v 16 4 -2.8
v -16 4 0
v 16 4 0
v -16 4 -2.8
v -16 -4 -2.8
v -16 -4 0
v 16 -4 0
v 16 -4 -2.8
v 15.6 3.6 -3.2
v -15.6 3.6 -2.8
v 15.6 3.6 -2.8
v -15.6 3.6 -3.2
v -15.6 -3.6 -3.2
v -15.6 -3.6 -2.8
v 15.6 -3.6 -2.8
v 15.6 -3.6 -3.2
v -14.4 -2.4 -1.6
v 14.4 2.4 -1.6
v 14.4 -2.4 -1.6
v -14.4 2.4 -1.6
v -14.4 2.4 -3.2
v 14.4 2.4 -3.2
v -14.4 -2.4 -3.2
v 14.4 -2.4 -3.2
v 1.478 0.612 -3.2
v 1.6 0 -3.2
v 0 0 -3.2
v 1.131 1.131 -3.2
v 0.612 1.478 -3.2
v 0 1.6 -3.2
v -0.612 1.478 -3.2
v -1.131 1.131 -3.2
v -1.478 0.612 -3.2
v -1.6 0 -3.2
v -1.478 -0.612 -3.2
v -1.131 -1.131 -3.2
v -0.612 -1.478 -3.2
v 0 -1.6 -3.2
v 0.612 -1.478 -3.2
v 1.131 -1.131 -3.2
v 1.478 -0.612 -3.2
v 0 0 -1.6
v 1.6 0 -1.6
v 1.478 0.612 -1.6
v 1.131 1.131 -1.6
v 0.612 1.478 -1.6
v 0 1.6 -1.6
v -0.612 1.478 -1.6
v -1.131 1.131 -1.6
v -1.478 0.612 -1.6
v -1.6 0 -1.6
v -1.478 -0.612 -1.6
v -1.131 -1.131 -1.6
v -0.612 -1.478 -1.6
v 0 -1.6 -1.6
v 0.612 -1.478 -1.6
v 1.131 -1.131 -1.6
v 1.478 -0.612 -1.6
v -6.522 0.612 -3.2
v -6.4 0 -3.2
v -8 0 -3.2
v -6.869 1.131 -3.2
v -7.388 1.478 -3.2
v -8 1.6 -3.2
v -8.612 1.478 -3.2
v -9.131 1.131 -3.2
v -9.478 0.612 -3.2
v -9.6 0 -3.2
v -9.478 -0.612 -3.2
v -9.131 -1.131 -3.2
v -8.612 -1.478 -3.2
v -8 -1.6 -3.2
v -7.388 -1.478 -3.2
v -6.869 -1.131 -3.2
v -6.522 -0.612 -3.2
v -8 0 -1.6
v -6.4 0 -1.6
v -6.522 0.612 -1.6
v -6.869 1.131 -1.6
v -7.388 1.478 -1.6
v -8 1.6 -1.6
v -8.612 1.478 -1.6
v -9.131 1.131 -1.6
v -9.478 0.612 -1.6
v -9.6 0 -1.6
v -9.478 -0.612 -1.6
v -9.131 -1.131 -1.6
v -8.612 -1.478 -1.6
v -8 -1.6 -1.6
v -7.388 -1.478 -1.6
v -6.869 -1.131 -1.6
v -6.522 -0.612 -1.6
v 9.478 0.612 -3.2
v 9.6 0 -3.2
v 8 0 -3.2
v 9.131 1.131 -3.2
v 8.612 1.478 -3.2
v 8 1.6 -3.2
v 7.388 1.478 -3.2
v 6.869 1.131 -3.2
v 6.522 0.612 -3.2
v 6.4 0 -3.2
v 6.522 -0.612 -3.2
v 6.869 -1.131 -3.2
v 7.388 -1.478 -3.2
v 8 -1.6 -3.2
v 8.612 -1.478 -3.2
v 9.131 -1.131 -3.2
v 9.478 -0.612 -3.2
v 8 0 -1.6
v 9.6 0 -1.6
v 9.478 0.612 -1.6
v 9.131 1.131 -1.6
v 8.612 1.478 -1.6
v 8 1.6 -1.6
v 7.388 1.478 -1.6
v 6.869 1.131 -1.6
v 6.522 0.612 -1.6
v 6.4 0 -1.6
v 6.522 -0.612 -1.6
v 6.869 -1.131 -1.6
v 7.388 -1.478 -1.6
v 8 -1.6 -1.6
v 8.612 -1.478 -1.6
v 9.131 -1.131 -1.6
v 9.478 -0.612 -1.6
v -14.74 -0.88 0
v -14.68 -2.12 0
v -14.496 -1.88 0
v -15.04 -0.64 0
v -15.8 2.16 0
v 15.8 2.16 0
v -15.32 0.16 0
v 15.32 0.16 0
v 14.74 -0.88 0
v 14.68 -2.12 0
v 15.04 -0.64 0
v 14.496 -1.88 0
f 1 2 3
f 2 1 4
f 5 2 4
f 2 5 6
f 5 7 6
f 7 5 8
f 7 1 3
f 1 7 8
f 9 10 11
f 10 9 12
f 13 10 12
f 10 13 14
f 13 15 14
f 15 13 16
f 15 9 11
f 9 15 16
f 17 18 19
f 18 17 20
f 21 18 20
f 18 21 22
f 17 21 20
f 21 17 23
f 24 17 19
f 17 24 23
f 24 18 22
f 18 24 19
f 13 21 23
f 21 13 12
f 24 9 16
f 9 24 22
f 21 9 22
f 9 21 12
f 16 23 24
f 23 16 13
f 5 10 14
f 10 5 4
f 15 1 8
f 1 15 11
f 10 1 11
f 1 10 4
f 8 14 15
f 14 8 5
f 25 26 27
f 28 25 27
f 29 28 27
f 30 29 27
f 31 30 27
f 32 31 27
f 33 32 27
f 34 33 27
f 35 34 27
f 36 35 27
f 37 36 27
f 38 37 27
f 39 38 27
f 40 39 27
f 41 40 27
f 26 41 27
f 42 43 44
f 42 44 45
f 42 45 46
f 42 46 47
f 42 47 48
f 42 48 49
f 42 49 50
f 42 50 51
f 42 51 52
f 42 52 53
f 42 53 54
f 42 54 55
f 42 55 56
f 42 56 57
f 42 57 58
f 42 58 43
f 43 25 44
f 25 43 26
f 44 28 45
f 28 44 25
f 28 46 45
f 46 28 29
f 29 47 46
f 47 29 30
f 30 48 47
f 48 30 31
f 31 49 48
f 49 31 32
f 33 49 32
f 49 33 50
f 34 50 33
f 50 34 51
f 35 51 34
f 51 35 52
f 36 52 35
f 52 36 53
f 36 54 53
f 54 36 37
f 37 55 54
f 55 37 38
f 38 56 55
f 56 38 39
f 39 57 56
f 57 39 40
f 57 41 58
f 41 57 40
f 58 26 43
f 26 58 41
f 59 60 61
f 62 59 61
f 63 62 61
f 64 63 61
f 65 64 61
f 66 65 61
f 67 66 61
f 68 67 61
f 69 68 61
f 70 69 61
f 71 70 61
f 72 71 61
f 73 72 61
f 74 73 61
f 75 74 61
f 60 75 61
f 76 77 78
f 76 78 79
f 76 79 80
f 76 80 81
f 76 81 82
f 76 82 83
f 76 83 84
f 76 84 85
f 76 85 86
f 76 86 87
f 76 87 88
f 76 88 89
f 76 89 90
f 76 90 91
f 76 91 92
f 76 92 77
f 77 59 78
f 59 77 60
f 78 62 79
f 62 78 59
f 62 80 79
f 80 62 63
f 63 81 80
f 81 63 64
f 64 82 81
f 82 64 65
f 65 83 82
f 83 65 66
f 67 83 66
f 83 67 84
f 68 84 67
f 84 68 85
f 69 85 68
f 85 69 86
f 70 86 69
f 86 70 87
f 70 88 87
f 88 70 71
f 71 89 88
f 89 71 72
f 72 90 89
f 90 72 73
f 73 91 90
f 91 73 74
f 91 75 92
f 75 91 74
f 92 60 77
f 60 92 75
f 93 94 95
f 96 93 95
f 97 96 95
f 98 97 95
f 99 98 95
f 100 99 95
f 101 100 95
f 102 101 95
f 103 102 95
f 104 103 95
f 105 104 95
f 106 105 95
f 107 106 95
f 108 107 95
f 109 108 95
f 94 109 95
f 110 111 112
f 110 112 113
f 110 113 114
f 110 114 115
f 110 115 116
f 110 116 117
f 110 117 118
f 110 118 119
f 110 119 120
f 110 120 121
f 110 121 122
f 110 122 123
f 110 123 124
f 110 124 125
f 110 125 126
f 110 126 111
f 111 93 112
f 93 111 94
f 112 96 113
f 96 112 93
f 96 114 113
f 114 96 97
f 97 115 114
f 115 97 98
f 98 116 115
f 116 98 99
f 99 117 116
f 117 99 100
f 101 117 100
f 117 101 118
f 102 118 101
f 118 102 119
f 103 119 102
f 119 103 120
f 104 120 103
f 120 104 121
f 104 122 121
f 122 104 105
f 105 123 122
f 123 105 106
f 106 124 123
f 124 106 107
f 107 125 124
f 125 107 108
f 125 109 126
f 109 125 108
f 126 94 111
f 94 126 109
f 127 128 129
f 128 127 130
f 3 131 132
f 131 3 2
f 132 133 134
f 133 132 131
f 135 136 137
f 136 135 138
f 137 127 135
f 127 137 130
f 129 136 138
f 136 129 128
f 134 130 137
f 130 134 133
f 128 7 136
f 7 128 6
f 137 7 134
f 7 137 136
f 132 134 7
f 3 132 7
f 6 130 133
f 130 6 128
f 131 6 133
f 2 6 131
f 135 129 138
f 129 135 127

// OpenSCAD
// file: ../p/4-4edge.scad
use <../lib.scad>
function ldraw_lib__4_4edge() = [
// 0 Circle 1.0
// 0 Name: 4-4edge.dat
// 0 Author: James Jessiman
// 0 !LDRAW_ORG Primitive UPDATE 2017-01
// 0 !LICENSE Licensed under CC BY 2.0 and CC BY 4.0 : see CAreadme.txt
// 
// 0 BFC CERTIFY CCW
  [0,"BFC","CERTIFY"],
  [0,"BFC","CCW"],
// 
// 0 !HISTORY 1998-12-15 [PTadmin] Official Update 1998-10
// 0 !HISTORY 2005-12-28 [PTadmin] Official Update 2005-01
// 0 !HISTORY 2007-06-24 [PTadmin] Header formatted for Contributor Agreement
// 0 !HISTORY 2008-07-01 [PTadmin] Official Update 2008-01
// 0 !HISTORY 2017-01-15 [Steffen] BFCed
// 0 !HISTORY 2017-12-30 [PTadmin] Official Update 2017-01
// 
// 
// 2 24 1 0 0 0.9239 0 0.3827
  [2,24,1,0,0,0.9239,0,0.3827],
// 2 24 0.9239 0 0.3827 0.7071 0 0.7071
  [2,24,0.9239,0,0.3827,0.7071,0,0.7071],
// 2 24 0.7071 0 0.7071 0.3827 0 0.9239
  [2,24,0.7071,0,0.7071,0.3827,0,0.9239],
// 2 24 0.3827 0 0.9239 0 0 1
  [2,24,0.3827,0,0.9239,0,0,1],
// 2 24 0 0 1 -0.3827 0 0.9239
  [2,24,0,0,1,-0.3827,0,0.9239],
// 2 24 -0.3827 0 0.9239 -0.7071 0 0.7071
  [2,24,-0.3827,0,0.9239,-0.7071,0,0.7071],
// 2 24 -0.7071 0 0.7071 -0.9239 0 0.3827
  [2,24,-0.7071,0,0.7071,-0.9239,0,0.3827],
// 2 24 -0.9239 0 0.3827 -1 0 -0
  [2,24,-0.9239,0,0.3827,-1,0,-0],
// 2 24 -1 0 -0 -0.9239 0 -0.3827
  [2,24,-1,0,-0,-0.9239,0,-0.3827],
// 2 24 -0.9239 0 -0.3827 -0.7071 0 -0.7071
  [2,24,-0.9239,0,-0.3827,-0.7071,0,-0.7071],
// 2 24 -0.7071 0 -0.7071 -0.3827 0 -0.9239
  [2,24,-0.7071,0,-0.7071,-0.3827,0,-0.9239],
// 2 24 -0.3827 0 -0.9239 0 0 -1
  [2,24,-0.3827,0,-0.9239,0,0,-1],
// 2 24 0 0 -1 0.3827 0 -0.9239
  [2,24,0,0,-1,0.3827,0,-0.9239],
// 2 24 0.3827 0 -0.9239 0.7071 0 -0.7071
  [2,24,0.3827,0,-0.9239,0.7071,0,-0.7071],
// 2 24 0.7071 0 -0.7071 0.9239 0 -0.3827
  [2,24,0.7071,0,-0.7071,0.9239,0,-0.3827],
// 2 24 0.9239 0 -0.3827 1 0 0
  [2,24,0.9239,0,-0.3827,1,0,0],
];
module ldraw_lib__4_4edge(step=0, col=false, unit=2/5, alt=false, line=0.2, solid=!$preview)
    makepoly(ldraw_lib__4_4edge(), step=step, col=col, unit=unit, alt=alt, line=line, solid=solid);
ldraw_lib__4_4edge(line=0.2);
// file: ../p/4-4disc.scad
use <../lib.scad>
function ldraw_lib__4_4disc() = [
// 0 Disc 1.0
// 0 Name: 4-4disc.dat
// 0 Author: James Jessiman
// 0 !LDRAW_ORG Primitive UPDATE 2002-02
// 0 !LICENSE Licensed under CC BY 2.0 and CC BY 4.0 : see CAreadme.txt
// 
// 0 BFC CERTIFY CCW
  [0,"BFC","CERTIFY"],
  [0,"BFC","CCW"],
// 
// 0 !HISTORY 1998-12-15 [PTadmin] Official Update 1998-10
// 0 !HISTORY 2002-03-23 [sbliss] Added BFC statement
// 0 !HISTORY 2002-04-25 [PTadmin] Official Update 2002-02
// 0 !HISTORY 2007-06-24 [PTadmin] Header formatted for Contributor Agreement
// 0 !HISTORY 2008-07-01 [PTadmin] Official Update 2008-01
// 
// 
// 3 16 0 0 0 1 0 0 0.9239 0 0.3827
  [3,16,0,0,0,1,0,0,0.9239,0,0.3827],
// 3 16 0 0 0 0.9239 0 0.3827 0.7071 0 0.7071
  [3,16,0,0,0,0.9239,0,0.3827,0.7071,0,0.7071],
// 3 16 0 0 0 0.7071 0 0.7071 0.3827 0 0.9239
  [3,16,0,0,0,0.7071,0,0.7071,0.3827,0,0.9239],
// 3 16 0 0 0 0.3827 0 0.9239 0 0 1
  [3,16,0,0,0,0.3827,0,0.9239,0,0,1],
// 3 16 0 0 0 0 0 1 -0.3827 0 0.9239
  [3,16,0,0,0,0,0,1,-0.3827,0,0.9239],
// 3 16 0 0 0 -0.3827 0 0.9239 -0.7071 0 0.7071
  [3,16,0,0,0,-0.3827,0,0.9239,-0.7071,0,0.7071],
// 3 16 0 0 0 -0.7071 0 0.7071 -0.9239 0 0.3827
  [3,16,0,0,0,-0.7071,0,0.7071,-0.9239,0,0.3827],
// 3 16 0 0 0 -0.9239 0 0.3827 -1 0 -0
  [3,16,0,0,0,-0.9239,0,0.3827,-1,0,-0],
// 3 16 0 0 0 -1 0 -0 -0.9239 0 -0.3827
  [3,16,0,0,0,-1,0,-0,-0.9239,0,-0.3827],
// 3 16 0 0 0 -0.9239 0 -0.3827 -0.7071 0 -0.7071
  [3,16,0,0,0,-0.9239,0,-0.3827,-0.7071,0,-0.7071],
// 3 16 0 0 0 -0.7071 0 -0.7071 -0.3827 0 -0.9239
  [3,16,0,0,0,-0.7071,0,-0.7071,-0.3827,0,-0.9239],
// 3 16 0 0 0 -0.3827 0 -0.9239 0 0 -1
  [3,16,0,0,0,-0.3827,0,-0.9239,0,0,-1],
// 3 16 0 0 0 0 0 -1 0.3827 0 -0.9239
  [3,16,0,0,0,0,0,-1,0.3827,0,-0.9239],
// 3 16 0 0 0 0.3827 0 -0.9239 0.7071 0 -0.7071
  [3,16,0,0,0,0.3827,0,-0.9239,0.7071,0,-0.7071],
// 3 16 0 0 0 0.7071 0 -0.7071 0.9239 0 -0.3827
  [3,16,0,0,0,0.7071,0,-0.7071,0.9239,0,-0.3827],
// 3 16 0 0 0 0.9239 0 -0.3827 1 0 0
  [3,16,0,0,0,0.9239,0,-0.3827,1,0,0],
// 0
];
module ldraw_lib__4_4disc(step=0, col=false, unit=2/5, alt=false, line=0.2, solid=!$preview)
    makepoly(ldraw_lib__4_4disc(), step=step, col=col, unit=unit, alt=alt, line=line, solid=solid);
ldraw_lib__4_4disc(line=0.2);
// file: ../p/4-4cyli.scad
use <../lib.scad>
$fa=1; $fs=0.2;
function ldraw_lib__4_4cyli(realsolid=false) = [
// 0 Cylinder 1.0
// 0 Name: 4-4cyli.dat
// 0 Author: James Jessiman
// 0 !LDRAW_ORG Primitive UPDATE 2005-01
// 0 !LICENSE Licensed under CC BY 2.0 and CC BY 4.0 : see CAreadme.txt
// 
// 0 BFC CERTIFY CCW
  [0,"BFC","CERTIFY"],
  [0,"BFC","CCW"],
// 
// 0 !HISTORY 1998-12-15 [PTadmin] Official Update 1998-10
// 0 !HISTORY 2002-03-23 [sbliss] Added BFC statement; merged headers from files in distributions LDraw 0.27 and Complete.
// 0 !HISTORY 2002-04-25 [PTadmin] Official Update 2002-02
// 0 !HISTORY 2004-12-14 [guyvivan] BFC CCW
// 0 !HISTORY 2005-12-28 [PTadmin] Official Update 2005-01
// 0 !HISTORY 2007-06-24 [PTadmin] Header formatted for Contributor Agreement
// 0 !HISTORY 2008-07-01 [PTadmin] Official Update 2008-01
// 
// 
// 4 16 1 1 0 0.9239 1 0.3827 0.9239 0 0.3827 1 0 0
  [4,16,1,1,0,0.9239,1,0.3827,0.9239,0,0.3827,1,0,0],
// 5 24 1 0 0 1 1 0 0.9239 0 0.3827 0.9239 0 -0.3827
  [5,24,1,0,0,1,1,0,0.9239,0,0.3827,0.9239,0,-0.3827],
// 4 16 0.9239 1 0.3827 0.7071 1 0.7071 0.7071 0 0.7071 0.9239 0 0.3827
  [4,16,0.9239,1,0.3827,0.7071,1,0.7071,0.7071,0,0.7071,0.9239,0,0.3827],
// 5 24 0.9239 0 0.3827 0.9239 1 0.3827 0.7071 0 0.7071 1 0 0
  [5,24,0.9239,0,0.3827,0.9239,1,0.3827,0.7071,0,0.7071,1,0,0],
// 4 16 0.7071 1 0.7071 0.3827 1 0.9239 0.3827 0 0.9239 0.7071 0 0.7071
  [4,16,0.7071,1,0.7071,0.3827,1,0.9239,0.3827,0,0.9239,0.7071,0,0.7071],
// 5 24 0.7071 0 0.7071 0.7071 1 0.7071 0.3827 0 0.9239 0.9239 0 0.3827
  [5,24,0.7071,0,0.7071,0.7071,1,0.7071,0.3827,0,0.9239,0.9239,0,0.3827],
// 4 16 0.3827 1 0.9239 0 1 1 0 0 1 0.3827 0 0.9239
  [4,16,0.3827,1,0.9239,0,1,1,0,0,1,0.3827,0,0.9239],
// 5 24 0.3827 0 0.9239 0.3827 1 0.9239 0 0 1 0.7071 0 0.7071
  [5,24,0.3827,0,0.9239,0.3827,1,0.9239,0,0,1,0.7071,0,0.7071],
// 4 16 0 1 1 -0.3827 1 0.9239 -0.3827 0 0.9239 0 0 1
  [4,16,0,1,1,-0.3827,1,0.9239,-0.3827,0,0.9239,0,0,1],
// 5 24 0 0 1 0 1 1 -0.3827 0 0.9239 0.3827 0 0.9239
  [5,24,0,0,1,0,1,1,-0.3827,0,0.9239,0.3827,0,0.9239],
// 4 16 -0.3827 1 0.9239 -0.7071 1 0.7071 -0.7071 0 0.7071 -0.3827 0 0.9239
  [4,16,-0.3827,1,0.9239,-0.7071,1,0.7071,-0.7071,0,0.7071,-0.3827,0,0.9239],
// 5 24 -0.3827 0 0.9239 -0.3827 1 0.9239 -0.7071 0 0.7071 0 0 1
  [5,24,-0.3827,0,0.9239,-0.3827,1,0.9239,-0.7071,0,0.7071,0,0,1],
// 4 16 -0.7071 1 0.7071 -0.9239 1 0.3827 -0.9239 0 0.3827 -0.7071 0 0.7071
  [4,16,-0.7071,1,0.7071,-0.9239,1,0.3827,-0.9239,0,0.3827,-0.7071,0,0.7071],
// 5 24 -0.7071 0 0.7071 -0.7071 1 0.7071 -0.9239 0 0.3827 -0.3827 0 0.9239
  [5,24,-0.7071,0,0.7071,-0.7071,1,0.7071,-0.9239,0,0.3827,-0.3827,0,0.9239],
// 4 16 -0.9239 1 0.3827 -1 1 0 -1 0 0 -0.9239 0 0.3827
  [4,16,-0.9239,1,0.3827,-1,1,0,-1,0,0,-0.9239,0,0.3827],
// 5 24 -0.9239 0 0.3827 -0.9239 1 0.3827 -1 0 0 -0.7071 0 0.7071
  [5,24,-0.9239,0,0.3827,-0.9239,1,0.3827,-1,0,0,-0.7071,0,0.7071],
// 4 16 -1 1 0 -0.9239 1 -0.3827 -0.9239 0 -0.3827 -1 0 0
  [4,16,-1,1,0,-0.9239,1,-0.3827,-0.9239,0,-0.3827,-1,0,0],
// 5 24 -1 0 0 -1 1 0 -0.9239 0 -0.3827 -0.9239 0 0.3827
  [5,24,-1,0,0,-1,1,0,-0.9239,0,-0.3827,-0.9239,0,0.3827],
// 4 16 -0.9239 1 -0.3827 -0.7071 1 -0.7071 -0.7071 0 -0.7071 -0.9239 0 -0.3827
  [4,16,-0.9239,1,-0.3827,-0.7071,1,-0.7071,-0.7071,0,-0.7071,-0.9239,0,-0.3827],
// 5 24 -0.9239 0 -0.3827 -0.9239 1 -0.3827 -0.7071 0 -0.7071 -1 0 0
  [5,24,-0.9239,0,-0.3827,-0.9239,1,-0.3827,-0.7071,0,-0.7071,-1,0,0],
// 4 16 -0.7071 1 -0.7071 -0.3827 1 -0.9239 -0.3827 0 -0.9239 -0.7071 0 -0.7071
  [4,16,-0.7071,1,-0.7071,-0.3827,1,-0.9239,-0.3827,0,-0.9239,-0.7071,0,-0.7071],
// 5 24 -0.7071 0 -0.7071 -0.7071 1 -0.7071 -0.3827 0 -0.9239 -0.9239 0 -0.3827
  [5,24,-0.7071,0,-0.7071,-0.7071,1,-0.7071,-0.3827,0,-0.9239,-0.9239,0,-0.3827],
// 4 16 -0.3827 1 -0.9239 0 1 -1 0 0 -1 -0.3827 0 -0.9239
  [4,16,-0.3827,1,-0.9239,0,1,-1,0,0,-1,-0.3827,0,-0.9239],
// 5 24 -0.3827 0 -0.9239 -0.3827 1 -0.9239 0 0 -1 -0.7071 0 -0.7071
  [5,24,-0.3827,0,-0.9239,-0.3827,1,-0.9239,0,0,-1,-0.7071,0,-0.7071],
// 4 16 0 1 -1 0.3827 1 -0.9239 0.3827 0 -0.9239 0 0 -1
  [4,16,0,1,-1,0.3827,1,-0.9239,0.3827,0,-0.9239,0,0,-1],
// 5 24 0 0 -1 0 1 -1 0.3827 0 -0.9239 -0.3827 0 -0.9239
  [5,24,0,0,-1,0,1,-1,0.3827,0,-0.9239,-0.3827,0,-0.9239],
// 4 16 0.3827 1 -0.9239 0.7071 1 -0.7071 0.7071 0 -0.7071 0.3827 0 -0.9239
  [4,16,0.3827,1,-0.9239,0.7071,1,-0.7071,0.7071,0,-0.7071,0.3827,0,-0.9239],
// 5 24 0.3827 0 -0.9239 0.3827 1 -0.9239 0.7071 0 -0.7071 0 0 -1
  [5,24,0.3827,0,-0.9239,0.3827,1,-0.9239,0.7071,0,-0.7071,0,0,-1],
// 4 16 0.7071 1 -0.7071 0.9239 1 -0.3827 0.9239 0 -0.3827 0.7071 0 -0.7071
  [4,16,0.7071,1,-0.7071,0.9239,1,-0.3827,0.9239,0,-0.3827,0.7071,0,-0.7071],
// 5 24 0.7071 0 -0.7071 0.7071 1 -0.7071 0.9239 0 -0.3827 0.3827 0 -0.9239
  [5,24,0.7071,0,-0.7071,0.7071,1,-0.7071,0.9239,0,-0.3827,0.3827,0,-0.9239],
// 4 16 0.9239 1 -0.3827 1 1 0 1 0 0 0.9239 0 -0.3827
  [4,16,0.9239,1,-0.3827,1,1,0,1,0,0,0.9239,0,-0.3827],
// 5 24 0.9239 0 -0.3827 0.9239 1 -0.3827 1 0 0 0.7071 0 -0.7071
  [5,24,0.9239,0,-0.3827,0.9239,1,-0.3827,1,0,0,0.7071,0,-0.7071],
// 0
];
module ldraw_lib__4_4cyli(step=0, col=false, unit=2/5, alt=false, line=0.2, solid=!$preview)
    makepoly(ldraw_lib__4_4cyli(solid), step=step, col=col, unit=unit, alt=alt, line=line, solid=solid);
ldraw_lib__4_4cyli(line=0.2);
// file: ../p/stud3.scad
use <../lib.scad>
use <4-4cyli.scad>
use <4-4disc.scad>
use <4-4edge.scad>
function ldraw_lib__stud3() = [
// 0 Stud Tube Solid
// 0 Name: stud3.dat
// 0 Author: James Jessiman
// 0 !LDRAW_ORG Primitive UPDATE 2012-01
// 0 !LICENSE Licensed under CC BY 4.0 : see CAreadme.txt
// 
// 0 BFC CERTIFY CCW
  [0,"BFC","CERTIFY"],
  [0,"BFC","CCW"],
// 
// 0 !HISTORY 2002-04-04 [sbliss] Modified for BFC compliance
// 0 !HISTORY 2002-04-25 [PTadmin] Official Update 2002-02
// 0 !HISTORY 2007-06-24 [PTadmin] Header formatted for Contributor Agreement
// 0 !HISTORY 2008-07-01 [PTadmin] Official Update 2008-01
// 0 !HISTORY 2012-02-16 [Philo] Changed to CCW
// 0 !HISTORY 2012-03-30 [PTadmin] Official Update 2012-01
// 
// 
// 1 16 0 -4 0 4 0 0 0 1 0 0 0 4 4-4edge.dat
  [1,16,0,-4,0,4,0,0,0,1,0,0,0,4, ldraw_lib__4_4edge()],
// 1 16 0 0 0 4 0 0 0 1 0 0 0 4 4-4edge.dat
  [1,16,0,0,0,4,0,0,0,1,0,0,0,4, ldraw_lib__4_4edge()],
// 1 16 0 -4 0 4 0 0 0 1 0 0 0 4 4-4disc.dat
  [1,16,0,-4,0,4,0,0,0,1,0,0,0,4, ldraw_lib__4_4disc()],
  [-1,16,0,0,0,4,0,0,0,-1,0,0,0,4, ldraw_lib__4_4disc()],
// 1 16 0 -4 0 4 0 0 0 4 0 0 0 4 4-4cyli.dat
  [1,16,0,-4,0,4,0,0,0,4,0,0,0,4, ldraw_lib__4_4cyli()],
];
module ldraw_lib__stud3(step=0, col=false, unit=2/5, alt=false, line=0.2, solid=!$preview)
    makepoly(ldraw_lib__stud3(), step=step, col=col, unit=unit, alt=alt, line=line, solid=solid);
ldraw_lib__stud3(line=0.2);
// file: ../p/box5.scad
use <../lib.scad>
function ldraw_lib__box5() = [
// 0 Box with 5 Faces and All Edges
// 0 Name: box5.dat
// 0 Author: James Jessiman
// 0 !LDRAW_ORG Primitive UPDATE 2012-01
// 0 !LICENSE Licensed under CC BY 2.0 and CC BY 4.0 : see CAreadme.txt
// 
// 0 BFC CERTIFY CCW
  [0,"BFC","CERTIFY"],
  [0,"BFC","CCW"],
// 
// 0 !HISTORY 2002-04-03 [sbliss] Modified for BFC compliance
// 0 !HISTORY 2002-04-25 [PTadmin] Official Update 2002-02
// 0 !HISTORY 2007-06-24 [PTadmin] Header formatted for Contributor Agreement
// 0 !HISTORY 2008-07-01 [PTadmin] Official Update 2008-01
// 0 !HISTORY 2012-02-16 [Philo] Changed to CCW
// 0 !HISTORY 2012-03-30 [PTadmin] Official Update 2012-01
// 
// 
// 2 24 1 1 1 -1 1 1
  [2,24,1,1,1,-1,1,1],
// 2 24 -1 1 1 -1 1 -1
  [2,24,-1,1,1,-1,1,-1],
// 2 24 -1 1 -1 1 1 -1
  [2,24,-1,1,-1,1,1,-1],
// 2 24 1 1 -1 1 1 1
  [2,24,1,1,-1,1,1,1],
// 2 24 1 0 1 -1 0 1
  [2,24,1,0,1,-1,0,1],
// 2 24 -1 0 1 -1 0 -1
  [2,24,-1,0,1,-1,0,-1],
// 2 24 -1 0 -1 1 0 -1
  [2,24,-1,0,-1,1,0,-1],
// 2 24 1 0 -1 1 0 1
  [2,24,1,0,-1,1,0,1],
// 2 24 1 0 1 1 1 1
  [2,24,1,0,1,1,1,1],
// 2 24 -1 0 1 -1 1 1
  [2,24,-1,0,1,-1,1,1],
// 2 24 1 0 -1 1 1 -1
  [2,24,1,0,-1,1,1,-1],
// 2 24 -1 0 -1 -1 1 -1
  [2,24,-1,0,-1,-1,1,-1],
// 4 16 -1 1 1 1 1 1 1 1 -1 -1 1 -1
  [4,16,-1,1,1,1,1,1,1,1,-1,-1,1,-1],
// 4 16 -1 1 1 -1 0 1 1 0 1 1 1 1
  [4,16,-1,1,1,-1,0,1,1,0,1,1,1,1],
// 4 16 -1 1 -1 -1 0 -1 -1 0 1 -1 1 1
  [4,16,-1,1,-1,-1,0,-1,-1,0,1,-1,1,1],
// 4 16 1 1 -1 1 0 -1 -1 0 -1 -1 1 -1
  [4,16,1,1,-1,1,0,-1,-1,0,-1,-1,1,-1],
// 4 16 1 1 1 1 0 1 1 0 -1 1 1 -1
  [4,16,1,1,1,1,0,1,1,0,-1,1,1,-1],
];
makepoly(ldraw_lib__box5(), line=0.2);
// file: ../p/box4.scad
use <../lib.scad>
function ldraw_lib__box4() = [
// 0 Box with 4 Faces (2 Parallel Pairs) and All Edges
// 0 Name: box4.dat
// 0 Author: James Jessiman
// 0 !LDRAW_ORG Primitive UPDATE 2012-01
// 0 !LICENSE Licensed under CC BY 4.0 : see CAreadme.txt
// 
// 0 BFC CERTIFY CCW
  [0,"BFC","CERTIFY"],
  [0,"BFC","CCW"],
// 
// 0 !HISTORY 2002-04-03 [sbliss] Modified for BFC compliance
// 0 !HISTORY 2002-04-25 [PTadmin] Official Update 2002-02
// 0 !HISTORY 2007-06-24 [PTadmin] Header formatted for Contributor Agreement
// 0 !HISTORY 2008-07-01 [PTadmin] Official Update 2008-01
// 0 !HISTORY 2012-02-16 [Philo] Changed to CCW
// 0 !HISTORY 2012-03-30 [PTadmin] Official Update 2012-01
// 
// 
// 2 24 1 1 1 -1 1 1
  [2,24,1,1,1,-1,1,1],
// 2 24 -1 1 1 -1 1 -1
  [2,24,-1,1,1,-1,1,-1],
// 2 24 -1 1 -1 1 1 -1
  [2,24,-1,1,-1,1,1,-1],
// 2 24 1 1 -1 1 1 1
  [2,24,1,1,-1,1,1,1],
// 2 24 1 0 1 -1 0 1
  [2,24,1,0,1,-1,0,1],
// 2 24 -1 0 1 -1 0 -1
  [2,24,-1,0,1,-1,0,-1],
// 2 24 -1 0 -1 1 0 -1
  [2,24,-1,0,-1,1,0,-1],
// 2 24 1 0 -1 1 0 1
  [2,24,1,0,-1,1,0,1],
// 2 24 1 0 1 1 1 1
  [2,24,1,0,1,1,1,1],
// 2 24 -1 0 1 -1 1 1
  [2,24,-1,0,1,-1,1,1],
// 2 24 1 0 -1 1 1 -1
  [2,24,1,0,-1,1,1,-1],
// 2 24 -1 0 -1 -1 1 -1
  [2,24,-1,0,-1,-1,1,-1],
// 4 16 -1 1 1 -1 0 1 1 0 1 1 1 1
  [4,16,-1,1,1,-1,0,1,1,0,1,1,1,1],
// 4 16 -1 1 -1 -1 0 -1 -1 0 1 -1 1 1
  [4,16,-1,1,-1,-1,0,-1,-1,0,1,-1,1,1],
// 4 16 1 1 -1 1 0 -1 -1 0 -1 -1 1 -1
  [4,16,1,1,-1,1,0,-1,-1,0,-1,-1,1,-1],
// 4 16 1 1 1 1 0 1 1 0 -1 1 1 -1
  [4,16,1,1,1,1,0,1,1,0,-1,1,1,-1],
];
module ldraw_lib__box4(step=0, col=false, unit=2/5, alt=false, line=0.2, solid=!$preview)
    makepoly(ldraw_lib__box4(), step=step, col=col, unit=unit, alt=alt, line=line, solid=solid);
ldraw_lib__box4(line=0.2);
// file: s/2431s01.scad
use <../../lib.scad>
use <../../p/box4.scad>
use <../../p/box5.scad>
use <../../p/stud3.scad>
function ldraw_lib__s__2431s01() = [
// 0 ~Tile  1 x  4 with Groove without Top Face
// 0 Name: s\2431s01.dat
// 0 Author: Santeri Piippo [arezey]
// 0 !LDRAW_ORG Subpart UPDATE 2010-02
// 0 !LICENSE Licensed under CC BY 2.0 and CC BY 4.0 : see CAreadme.txt
// 
// 0 BFC CERTIFY CCW
  [0,"BFC","CERTIFY"],
  [0,"BFC","CCW"],
// 
// 0 !HISTORY 2010-07-05 [PTadmin] Official Update 2010-02
// 
// 
// 1 16 0 0 0 40 0 0 0 7 0 0 0 10 box4.dat
  [1,16,0,0,0,40,0,0,0,7,0,0,0,10, ldraw_lib__box4()],
// 1 16 0 7 0 39 0 0 0 1 0 0 0 9 box4.dat
  [1,16,0,7,0,39,0,0,0,1,0,0,0,9, ldraw_lib__box4()],
// 0 BFC INVERTNEXT
  [0,"BFC","INVERTNEXT"],
// 1 16 0 8 0 36 0 0 0 -4 0 0 0 6 box5.dat
  [1,16,0,8,0,36,0,0,0,-4,0,0,0,6, ldraw_lib__box5()],
// 4 16 -39 8 9 -36 8 6 -36 8 -6 -39 8 -9
  [4,16,-39,8,9,-36,8,6,-36,8,-6,-39,8,-9],
// 4 16 39 8 -9 36 8 -6 36 8 6 39 8 9
  [4,16,39,8,-9,36,8,-6,36,8,6,39,8,9],
// 4 16 39 8 9 36 8 6 -36 8 6 -39 8 9
  [4,16,39,8,9,36,8,6,-36,8,6,-39,8,9],
// 4 16 -39 8 -9 -36 8 -6 36 8 -6 39 8 -9
  [4,16,-39,8,-9,-36,8,-6,36,8,-6,39,8,-9],
// 4 16 -40 7 10 -39 7 9 -39 7 -9 -40 7 -10
  [4,16,-40,7,10,-39,7,9,-39,7,-9,-40,7,-10],
// 4 16 40 7 -10 39 7 -9 39 7 9 40 7 10
  [4,16,40,7,-10,39,7,-9,39,7,9,40,7,10],
// 4 16 40 7 10 39 7 9 -39 7 9 -40 7 10
  [4,16,40,7,10,39,7,9,-39,7,9,-40,7,10],
// 4 16 -40 7 -10 -39 7 -9 39 7 -9 40 7 -10
  [4,16,-40,7,-10,-39,7,-9,39,7,-9,40,7,-10],
// 1 16 0 4 0 1 0 0 0 -1 0 0 0 1 stud3.dat
  [1,16,0,4,0,1,0,0,0,-1,0,0,0,1, ldraw_lib__stud3()],
// 1 16 -20 4 0 1 0 0 0 -1 0 0 0 1 stud3.dat
  [1,16,-20,4,0,1,0,0,0,-1,0,0,0,1, ldraw_lib__stud3()],
// 1 16 20 4 0 1 0 0 0 -1 0 0 0 1 stud3.dat
  [1,16,20,4,0,1,0,0,0,-1,0,0,0,1, ldraw_lib__stud3()],
// 0 //
];
makepoly(ldraw_lib__s__2431s01(), line=0.2);
// main file
use <../lib.scad>
use <s/2431s01.scad>
function ldraw_lib__2431p73() = [
// 0 Tile  1 x  4 with White and Dark Blue Trapezoidal Stripes Pattern
// 0 Name: 2431p73.dat
// 0 Author: Bertrand Lequy [Berth]
// 0 !LDRAW_ORG Part UPDATE 2024-06
// 0 !LICENSE Licensed under CC BY 4.0 : see CAreadme.txt
// 
// 0 BFC CERTIFY CCW
  [0,"BFC","CERTIFY"],
  [0,"BFC","CCW"],
// 
// 0 !KEYWORDS Bricklink 2431pb856, Brickowl 946828, Rebrickable 2431pr9992
// 0 !KEYWORDS set 60400
// 
// 0 !HISTORY 2024-07-29 [OrionP] Official Update 2024-06
// 
// 1 16 0 0 0 1 0 0 0 1 0 0 0 1 s\2431s01.dat
  [1,16,0,0,0,1,0,0,0,1,0,0,0,1, ldraw_lib__s__2431s01()],
// 4 272 -37.6 0 -1.6 -36.7 0 -5.3 -36.24 0 -4.7 -36.85 0 -2.2
  [4,272,-37.6,0,-1.6,-36.7,0,-5.3,-36.24,0,-4.7,-36.85,0,-2.2],
// 4 16 -39.5 0 5.4 39.5 0 5.4 40 0 10 -40 0 10
  [4,16,-39.5,0,5.4,39.5,0,5.4,40,0,10,-40,0,10],
// 4 272 39.5 0 5.4 -39.5 0 5.4 -38.3 0 0.4 38.3 0 0.4
  [4,272,39.5,0,5.4,-39.5,0,5.4,-38.3,0,0.4,38.3,0,0.4],
// 4 272 36.24 0 -4.7 36.7 0 -5.3 37.6 0 -1.6 36.85 0 -2.2
  [4,272,36.24,0,-4.7,36.7,0,-5.3,37.6,0,-1.6,36.85,0,-2.2],
// 4 272 37.6 0 -1.6 -37.6 0 -1.6 -36.85 0 -2.2 36.85 0 -2.2
  [4,272,37.6,0,-1.6,-37.6,0,-1.6,-36.85,0,-2.2,36.85,0,-2.2],
// 4 272 36.7 0 -5.3 36.24 0 -4.7 -36.24 0 -4.7 -36.7 0 -5.3
  [4,272,36.7,0,-5.3,36.24,0,-4.7,-36.24,0,-4.7,-36.7,0,-5.3],
// 4 16 -38.3 0 0.4 -37.6 0 -1.6 37.6 0 -1.6 38.3 0 0.4
  [4,16,-38.3,0,0.4,-37.6,0,-1.6,37.6,0,-1.6,38.3,0,0.4],
// 4 16 -36.7 0 -5.3 -40 0 -10 40 0 -10 36.7 0 -5.3
  [4,16,-36.7,0,-5.3,-40,0,-10,40,0,-10,36.7,0,-5.3],
// 4 16 37.6 0 -1.6 36.7 0 -5.3 40 0 -10 38.3 0 0.4
  [4,16,37.6,0,-1.6,36.7,0,-5.3,40,0,-10,38.3,0,0.4],
// 3 16 39.5 0 5.4 38.3 0 0.4 40 0 -10
  [3,16,39.5,0,5.4,38.3,0,0.4,40,0,-10],
// 3 16 40 0 10 39.5 0 5.4 40 0 -10
  [3,16,40,0,10,39.5,0,5.4,40,0,-10],
// 4 16 -40 0 -10 -36.7 0 -5.3 -37.6 0 -1.6 -38.3 0 0.4
  [4,16,-40,0,-10,-36.7,0,-5.3,-37.6,0,-1.6,-38.3,0,0.4],
// 3 16 -39.5 0 5.4 -40 0 -10 -38.3 0 0.4
  [3,16,-39.5,0,5.4,-40,0,-10,-38.3,0,0.4],
// 3 16 -40 0 10 -40 0 -10 -39.5 0 5.4
  [3,16,-40,0,10,-40,0,-10,-39.5,0,5.4],
// 4 15 36.85 0 -2.2 -36.85 0 -2.2 -36.24 0 -4.7 36.24 0 -4.7
  [4,15,36.85,0,-2.2,-36.85,0,-2.2,-36.24,0,-4.7,36.24,0,-4.7],
];
module ldraw_lib__2431p73(step=0, col=false, unit=2/5, alt=false, line=0.2, solid=!$preview)
    makepoly(ldraw_lib__2431p73(), step=step, col=col, unit=unit, alt=alt, line=line, solid=solid);
ldraw_lib__2431p73(line=0.2);
